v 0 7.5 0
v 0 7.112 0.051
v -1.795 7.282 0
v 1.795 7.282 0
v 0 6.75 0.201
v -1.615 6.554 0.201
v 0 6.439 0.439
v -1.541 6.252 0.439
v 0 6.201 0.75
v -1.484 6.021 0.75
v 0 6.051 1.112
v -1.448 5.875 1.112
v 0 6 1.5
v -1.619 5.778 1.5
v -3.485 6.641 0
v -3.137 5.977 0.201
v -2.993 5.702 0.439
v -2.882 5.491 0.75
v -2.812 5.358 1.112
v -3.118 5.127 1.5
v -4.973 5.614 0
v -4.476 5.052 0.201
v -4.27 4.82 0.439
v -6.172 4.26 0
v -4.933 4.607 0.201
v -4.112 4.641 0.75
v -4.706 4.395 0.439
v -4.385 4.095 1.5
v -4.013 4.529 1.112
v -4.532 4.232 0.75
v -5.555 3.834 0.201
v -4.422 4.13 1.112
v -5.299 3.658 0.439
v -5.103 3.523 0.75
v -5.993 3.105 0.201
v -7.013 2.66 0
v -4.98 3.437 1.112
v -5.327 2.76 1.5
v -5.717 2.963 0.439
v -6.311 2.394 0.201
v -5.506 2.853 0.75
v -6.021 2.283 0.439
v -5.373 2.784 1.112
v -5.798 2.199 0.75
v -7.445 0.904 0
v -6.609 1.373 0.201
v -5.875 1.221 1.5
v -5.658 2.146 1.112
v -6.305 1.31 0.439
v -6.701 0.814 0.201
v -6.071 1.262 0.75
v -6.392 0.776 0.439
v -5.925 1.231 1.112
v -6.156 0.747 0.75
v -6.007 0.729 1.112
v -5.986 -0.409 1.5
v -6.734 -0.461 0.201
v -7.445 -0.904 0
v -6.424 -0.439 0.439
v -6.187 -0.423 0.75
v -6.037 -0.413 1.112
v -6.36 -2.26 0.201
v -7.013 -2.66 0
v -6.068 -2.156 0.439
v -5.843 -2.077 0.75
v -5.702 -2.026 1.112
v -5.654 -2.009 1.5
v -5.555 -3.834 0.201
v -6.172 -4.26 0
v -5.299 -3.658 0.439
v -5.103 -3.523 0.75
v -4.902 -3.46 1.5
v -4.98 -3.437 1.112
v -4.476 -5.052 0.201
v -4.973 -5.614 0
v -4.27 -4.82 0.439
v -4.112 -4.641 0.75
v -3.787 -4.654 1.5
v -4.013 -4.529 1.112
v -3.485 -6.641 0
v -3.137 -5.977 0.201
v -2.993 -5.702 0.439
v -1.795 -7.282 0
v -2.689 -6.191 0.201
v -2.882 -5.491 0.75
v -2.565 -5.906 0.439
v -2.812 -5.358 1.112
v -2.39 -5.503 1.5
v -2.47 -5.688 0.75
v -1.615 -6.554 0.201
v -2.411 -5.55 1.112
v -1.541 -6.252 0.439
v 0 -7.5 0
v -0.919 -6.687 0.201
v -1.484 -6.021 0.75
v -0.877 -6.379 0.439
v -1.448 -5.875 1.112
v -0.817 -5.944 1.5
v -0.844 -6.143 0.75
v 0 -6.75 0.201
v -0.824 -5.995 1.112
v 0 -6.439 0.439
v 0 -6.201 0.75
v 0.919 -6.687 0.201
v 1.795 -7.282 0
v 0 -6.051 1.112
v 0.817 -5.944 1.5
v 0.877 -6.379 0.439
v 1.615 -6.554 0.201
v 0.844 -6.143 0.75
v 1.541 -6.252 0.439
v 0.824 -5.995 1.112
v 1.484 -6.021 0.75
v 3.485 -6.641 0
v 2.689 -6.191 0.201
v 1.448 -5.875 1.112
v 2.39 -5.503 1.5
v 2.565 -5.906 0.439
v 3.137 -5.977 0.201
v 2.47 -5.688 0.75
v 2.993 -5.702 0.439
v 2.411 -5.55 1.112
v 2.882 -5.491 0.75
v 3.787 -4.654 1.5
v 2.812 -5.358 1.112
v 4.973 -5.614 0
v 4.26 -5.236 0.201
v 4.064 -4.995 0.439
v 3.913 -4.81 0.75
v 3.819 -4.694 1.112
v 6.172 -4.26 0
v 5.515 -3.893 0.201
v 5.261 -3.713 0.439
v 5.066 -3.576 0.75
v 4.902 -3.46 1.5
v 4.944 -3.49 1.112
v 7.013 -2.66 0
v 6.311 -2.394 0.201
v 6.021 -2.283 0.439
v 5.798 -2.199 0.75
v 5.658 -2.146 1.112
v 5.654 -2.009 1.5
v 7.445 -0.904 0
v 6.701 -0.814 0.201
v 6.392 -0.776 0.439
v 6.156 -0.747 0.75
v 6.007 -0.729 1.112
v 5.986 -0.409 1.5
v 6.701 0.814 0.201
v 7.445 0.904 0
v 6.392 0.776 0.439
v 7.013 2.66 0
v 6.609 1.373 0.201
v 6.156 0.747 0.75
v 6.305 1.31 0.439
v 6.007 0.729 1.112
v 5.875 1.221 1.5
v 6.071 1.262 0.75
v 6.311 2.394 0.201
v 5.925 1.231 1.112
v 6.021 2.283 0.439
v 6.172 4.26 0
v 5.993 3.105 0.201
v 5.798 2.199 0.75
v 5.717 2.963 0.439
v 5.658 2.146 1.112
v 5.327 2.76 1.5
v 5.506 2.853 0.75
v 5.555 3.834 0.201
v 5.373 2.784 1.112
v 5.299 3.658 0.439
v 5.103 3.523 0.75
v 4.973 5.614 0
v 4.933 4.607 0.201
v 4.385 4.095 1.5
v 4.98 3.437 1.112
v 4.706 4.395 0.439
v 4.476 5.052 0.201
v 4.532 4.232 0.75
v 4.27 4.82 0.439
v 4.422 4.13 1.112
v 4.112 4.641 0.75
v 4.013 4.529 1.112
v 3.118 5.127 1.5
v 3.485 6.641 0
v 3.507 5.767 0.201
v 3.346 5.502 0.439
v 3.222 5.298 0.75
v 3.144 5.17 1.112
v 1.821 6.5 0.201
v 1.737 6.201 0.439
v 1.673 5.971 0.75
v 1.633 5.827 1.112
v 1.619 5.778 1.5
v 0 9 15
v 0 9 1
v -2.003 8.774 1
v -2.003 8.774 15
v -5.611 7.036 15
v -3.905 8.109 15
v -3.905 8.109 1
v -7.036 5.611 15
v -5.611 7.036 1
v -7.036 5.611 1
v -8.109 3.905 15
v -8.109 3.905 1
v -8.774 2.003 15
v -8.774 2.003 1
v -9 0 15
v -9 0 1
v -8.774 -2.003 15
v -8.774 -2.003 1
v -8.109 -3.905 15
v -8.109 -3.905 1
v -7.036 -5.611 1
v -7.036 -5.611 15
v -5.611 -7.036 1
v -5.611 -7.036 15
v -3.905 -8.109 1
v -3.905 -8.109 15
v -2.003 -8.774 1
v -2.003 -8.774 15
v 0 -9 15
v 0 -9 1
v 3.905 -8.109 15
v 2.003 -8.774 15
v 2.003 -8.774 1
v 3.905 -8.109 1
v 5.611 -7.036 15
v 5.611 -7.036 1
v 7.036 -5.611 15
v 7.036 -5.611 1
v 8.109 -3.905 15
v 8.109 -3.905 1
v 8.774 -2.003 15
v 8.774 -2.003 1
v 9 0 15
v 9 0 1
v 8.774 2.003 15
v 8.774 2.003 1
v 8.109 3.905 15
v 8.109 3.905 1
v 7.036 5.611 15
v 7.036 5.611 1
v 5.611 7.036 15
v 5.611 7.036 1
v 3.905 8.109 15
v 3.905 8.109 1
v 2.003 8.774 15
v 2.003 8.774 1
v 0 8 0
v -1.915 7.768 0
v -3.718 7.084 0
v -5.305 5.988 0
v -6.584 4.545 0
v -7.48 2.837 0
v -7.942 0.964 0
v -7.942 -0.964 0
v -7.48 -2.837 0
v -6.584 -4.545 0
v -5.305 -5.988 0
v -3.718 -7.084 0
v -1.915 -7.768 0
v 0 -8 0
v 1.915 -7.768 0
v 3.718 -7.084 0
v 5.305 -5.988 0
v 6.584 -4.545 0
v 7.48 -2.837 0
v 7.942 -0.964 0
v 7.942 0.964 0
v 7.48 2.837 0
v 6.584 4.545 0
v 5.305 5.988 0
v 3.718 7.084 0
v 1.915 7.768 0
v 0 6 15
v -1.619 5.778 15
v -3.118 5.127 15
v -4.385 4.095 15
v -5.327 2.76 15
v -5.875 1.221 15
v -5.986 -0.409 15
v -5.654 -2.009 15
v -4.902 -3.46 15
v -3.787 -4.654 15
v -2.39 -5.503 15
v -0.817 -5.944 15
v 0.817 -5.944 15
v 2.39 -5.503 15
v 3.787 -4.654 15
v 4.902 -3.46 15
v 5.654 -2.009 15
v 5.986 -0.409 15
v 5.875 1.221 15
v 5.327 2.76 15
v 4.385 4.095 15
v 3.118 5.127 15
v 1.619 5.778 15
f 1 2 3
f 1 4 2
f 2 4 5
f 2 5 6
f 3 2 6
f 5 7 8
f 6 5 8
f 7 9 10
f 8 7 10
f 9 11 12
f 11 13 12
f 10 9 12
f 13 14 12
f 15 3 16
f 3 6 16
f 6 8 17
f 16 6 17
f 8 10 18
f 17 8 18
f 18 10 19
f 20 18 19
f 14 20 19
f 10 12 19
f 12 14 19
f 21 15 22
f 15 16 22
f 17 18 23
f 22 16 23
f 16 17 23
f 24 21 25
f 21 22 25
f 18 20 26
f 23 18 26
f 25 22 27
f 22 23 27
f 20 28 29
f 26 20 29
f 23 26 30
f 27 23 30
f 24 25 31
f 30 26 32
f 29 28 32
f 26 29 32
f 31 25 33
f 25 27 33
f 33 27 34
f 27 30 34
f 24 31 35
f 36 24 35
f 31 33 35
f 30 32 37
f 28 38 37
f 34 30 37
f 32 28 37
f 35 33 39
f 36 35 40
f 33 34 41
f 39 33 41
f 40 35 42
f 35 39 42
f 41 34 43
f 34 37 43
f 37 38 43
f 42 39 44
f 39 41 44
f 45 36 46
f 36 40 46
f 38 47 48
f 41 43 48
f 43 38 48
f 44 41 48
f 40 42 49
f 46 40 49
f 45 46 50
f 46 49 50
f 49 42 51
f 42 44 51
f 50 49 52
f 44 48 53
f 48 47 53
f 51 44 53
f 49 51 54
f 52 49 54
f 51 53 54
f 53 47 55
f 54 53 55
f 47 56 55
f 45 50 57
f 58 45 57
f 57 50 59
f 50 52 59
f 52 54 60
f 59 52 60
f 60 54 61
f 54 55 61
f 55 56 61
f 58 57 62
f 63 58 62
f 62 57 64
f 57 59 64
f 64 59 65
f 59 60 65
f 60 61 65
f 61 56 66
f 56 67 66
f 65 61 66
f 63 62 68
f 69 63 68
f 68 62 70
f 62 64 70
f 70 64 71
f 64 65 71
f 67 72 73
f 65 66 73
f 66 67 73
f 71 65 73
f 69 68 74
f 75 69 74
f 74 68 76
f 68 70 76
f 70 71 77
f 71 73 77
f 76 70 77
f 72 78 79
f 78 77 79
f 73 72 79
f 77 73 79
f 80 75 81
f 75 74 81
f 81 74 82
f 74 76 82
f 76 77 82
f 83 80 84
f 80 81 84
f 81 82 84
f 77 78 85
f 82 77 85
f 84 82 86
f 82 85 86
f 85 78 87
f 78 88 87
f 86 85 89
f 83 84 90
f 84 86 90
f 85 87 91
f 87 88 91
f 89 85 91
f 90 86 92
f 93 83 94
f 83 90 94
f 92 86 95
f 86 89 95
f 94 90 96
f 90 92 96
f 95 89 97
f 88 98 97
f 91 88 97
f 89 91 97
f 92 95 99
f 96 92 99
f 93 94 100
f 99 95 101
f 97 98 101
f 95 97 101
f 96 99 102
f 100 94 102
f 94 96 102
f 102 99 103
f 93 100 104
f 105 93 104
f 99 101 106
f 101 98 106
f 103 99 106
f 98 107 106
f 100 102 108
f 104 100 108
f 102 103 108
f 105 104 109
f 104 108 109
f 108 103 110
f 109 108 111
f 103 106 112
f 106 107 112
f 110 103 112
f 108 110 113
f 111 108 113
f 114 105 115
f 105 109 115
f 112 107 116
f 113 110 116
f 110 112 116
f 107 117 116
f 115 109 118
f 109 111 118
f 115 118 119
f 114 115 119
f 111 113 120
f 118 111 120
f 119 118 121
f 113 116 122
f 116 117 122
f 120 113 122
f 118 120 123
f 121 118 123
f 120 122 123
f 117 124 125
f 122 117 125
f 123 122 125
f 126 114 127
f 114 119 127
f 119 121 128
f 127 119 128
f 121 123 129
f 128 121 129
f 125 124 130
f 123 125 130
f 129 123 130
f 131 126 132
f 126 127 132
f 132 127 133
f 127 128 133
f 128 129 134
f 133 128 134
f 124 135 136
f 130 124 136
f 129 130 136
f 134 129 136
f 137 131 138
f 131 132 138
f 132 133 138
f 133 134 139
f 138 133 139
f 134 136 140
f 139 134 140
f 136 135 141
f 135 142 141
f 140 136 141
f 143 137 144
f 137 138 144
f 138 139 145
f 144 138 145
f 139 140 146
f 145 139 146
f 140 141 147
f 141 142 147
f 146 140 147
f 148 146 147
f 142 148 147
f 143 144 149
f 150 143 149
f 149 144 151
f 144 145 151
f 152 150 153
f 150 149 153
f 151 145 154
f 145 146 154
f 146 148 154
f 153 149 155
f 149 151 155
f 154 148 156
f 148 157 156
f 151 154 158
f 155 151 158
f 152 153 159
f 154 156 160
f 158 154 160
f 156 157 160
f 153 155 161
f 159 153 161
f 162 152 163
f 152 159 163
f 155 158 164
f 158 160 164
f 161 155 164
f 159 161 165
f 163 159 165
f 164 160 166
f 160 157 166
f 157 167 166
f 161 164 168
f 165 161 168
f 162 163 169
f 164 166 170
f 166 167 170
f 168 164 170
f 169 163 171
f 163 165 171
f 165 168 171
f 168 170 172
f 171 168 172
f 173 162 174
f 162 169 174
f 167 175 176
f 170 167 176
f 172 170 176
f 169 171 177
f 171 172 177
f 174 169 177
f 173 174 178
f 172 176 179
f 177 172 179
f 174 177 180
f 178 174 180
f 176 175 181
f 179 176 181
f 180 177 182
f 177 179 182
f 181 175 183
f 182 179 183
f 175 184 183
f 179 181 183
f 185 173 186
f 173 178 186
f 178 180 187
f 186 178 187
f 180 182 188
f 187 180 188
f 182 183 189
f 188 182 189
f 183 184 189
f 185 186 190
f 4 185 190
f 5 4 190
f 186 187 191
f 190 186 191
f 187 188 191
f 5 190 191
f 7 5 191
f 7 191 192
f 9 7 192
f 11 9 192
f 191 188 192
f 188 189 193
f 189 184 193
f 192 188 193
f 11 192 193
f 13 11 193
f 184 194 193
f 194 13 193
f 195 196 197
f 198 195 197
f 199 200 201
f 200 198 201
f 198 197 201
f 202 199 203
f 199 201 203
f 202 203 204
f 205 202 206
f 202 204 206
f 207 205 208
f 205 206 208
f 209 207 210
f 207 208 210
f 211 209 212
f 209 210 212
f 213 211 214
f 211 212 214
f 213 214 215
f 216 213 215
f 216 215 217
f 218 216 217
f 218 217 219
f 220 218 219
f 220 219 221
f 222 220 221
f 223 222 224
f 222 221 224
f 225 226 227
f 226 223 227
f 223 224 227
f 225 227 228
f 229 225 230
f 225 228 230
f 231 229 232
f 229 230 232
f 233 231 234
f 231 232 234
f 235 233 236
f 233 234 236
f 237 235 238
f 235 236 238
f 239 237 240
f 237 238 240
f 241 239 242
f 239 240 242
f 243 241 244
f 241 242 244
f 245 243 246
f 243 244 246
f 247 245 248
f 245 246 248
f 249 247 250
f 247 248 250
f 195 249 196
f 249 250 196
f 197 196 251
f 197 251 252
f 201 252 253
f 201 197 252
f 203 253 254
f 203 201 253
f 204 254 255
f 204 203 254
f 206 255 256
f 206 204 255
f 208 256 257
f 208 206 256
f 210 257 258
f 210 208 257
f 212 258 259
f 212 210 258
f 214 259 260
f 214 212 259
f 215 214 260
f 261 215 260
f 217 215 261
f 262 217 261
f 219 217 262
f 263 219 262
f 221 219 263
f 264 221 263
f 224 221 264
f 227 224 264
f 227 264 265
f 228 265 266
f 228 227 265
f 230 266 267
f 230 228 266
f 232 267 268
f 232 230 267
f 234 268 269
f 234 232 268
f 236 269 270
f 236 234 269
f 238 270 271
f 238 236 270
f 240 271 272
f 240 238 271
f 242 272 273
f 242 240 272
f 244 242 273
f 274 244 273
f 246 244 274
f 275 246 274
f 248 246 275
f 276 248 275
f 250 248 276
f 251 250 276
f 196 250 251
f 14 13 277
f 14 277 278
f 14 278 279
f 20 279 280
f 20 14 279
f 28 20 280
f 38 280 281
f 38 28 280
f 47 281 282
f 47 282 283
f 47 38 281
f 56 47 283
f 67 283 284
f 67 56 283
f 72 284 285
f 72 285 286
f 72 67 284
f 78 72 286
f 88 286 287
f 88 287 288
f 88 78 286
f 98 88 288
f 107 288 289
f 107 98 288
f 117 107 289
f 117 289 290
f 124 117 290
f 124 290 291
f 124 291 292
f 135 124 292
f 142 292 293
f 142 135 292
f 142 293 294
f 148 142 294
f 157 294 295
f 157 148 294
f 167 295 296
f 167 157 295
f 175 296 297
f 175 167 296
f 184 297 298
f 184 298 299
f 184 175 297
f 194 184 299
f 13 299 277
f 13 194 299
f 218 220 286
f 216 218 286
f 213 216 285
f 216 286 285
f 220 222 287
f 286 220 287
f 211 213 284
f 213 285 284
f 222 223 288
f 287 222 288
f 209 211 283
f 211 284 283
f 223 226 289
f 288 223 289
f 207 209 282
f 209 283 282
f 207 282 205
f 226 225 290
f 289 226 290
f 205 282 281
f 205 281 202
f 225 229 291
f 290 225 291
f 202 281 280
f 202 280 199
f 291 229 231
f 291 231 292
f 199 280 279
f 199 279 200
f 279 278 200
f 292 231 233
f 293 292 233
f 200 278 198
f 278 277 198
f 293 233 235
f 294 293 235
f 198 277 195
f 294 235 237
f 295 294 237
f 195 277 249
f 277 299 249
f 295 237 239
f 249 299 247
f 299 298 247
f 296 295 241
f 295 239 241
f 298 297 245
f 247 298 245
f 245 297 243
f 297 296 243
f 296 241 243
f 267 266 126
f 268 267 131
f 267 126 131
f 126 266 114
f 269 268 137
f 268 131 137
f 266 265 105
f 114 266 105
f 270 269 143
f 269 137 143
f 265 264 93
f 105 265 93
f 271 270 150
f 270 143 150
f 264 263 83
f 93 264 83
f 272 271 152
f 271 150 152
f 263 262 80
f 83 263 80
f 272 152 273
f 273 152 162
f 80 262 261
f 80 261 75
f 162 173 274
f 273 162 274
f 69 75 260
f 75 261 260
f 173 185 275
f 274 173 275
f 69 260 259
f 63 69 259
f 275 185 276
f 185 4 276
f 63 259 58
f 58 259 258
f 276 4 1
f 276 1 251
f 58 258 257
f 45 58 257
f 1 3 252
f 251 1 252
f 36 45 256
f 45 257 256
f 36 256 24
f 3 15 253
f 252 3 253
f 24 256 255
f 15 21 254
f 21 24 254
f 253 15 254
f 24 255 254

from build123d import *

# Parameters (mm, degrees)
SKETCH_1_W     = 15
SKETCH_1_H     = 3
SKETCH_2_W     = 3
SKETCH_2_H     = 6.5
SKETCH_3_W     = 3
SKETCH_3_H     = 9
CHAMFER_1_SIZE = 1
FILLET_2_R     = 1.5


with BuildPart() as part:
    # 草图1 → 旋转1 (revolve)
    with BuildSketch(Plane(origin=(0, 0, 0), x_dir=(0, 0, -1), z_dir=(1, 0, 0)), mode=Mode.PRIVATE) as revolve_1_sk:
        with Locations((-7.5, -7.5)):
            Rectangle(SKETCH_1_W, SKETCH_1_H)
        Polygon((-15, -9), (-15, -6), (-15, 0), (-18, 0), (-18, -9), align=None)
    revolve(revolve_1_sk.sketch.rotate(Axis((0, 0, 0), (0, 0, 1)), 180), axis=Axis((0, 0, 0), (0, 0, 1)))

    # 草图2 → 切除-旋转1 (revolve, cut)
    with BuildSketch(Plane(origin=(0, 0, 0), x_dir=(0, 0, -1), z_dir=(1, 0, 0)), mode=Mode.PRIVATE) as cut_revolve_1_sk:
        with Locations((-16.5, -3.25)):
            Rectangle(SKETCH_2_W, SKETCH_2_H)
    revolve(cut_revolve_1_sk.sketch.rotate(Axis((0, 0, 18), (0, 0, -1)), 270), axis=Axis((0, 0, 18), (0, 0, -1)), mode=Mode.SUBTRACT)

    # 草图3 → 切除-旋转2 (revolve, cut)
    with BuildSketch(Plane(origin=(0, 0, 0), x_dir=(0, 0, -1), z_dir=(1, 0, 0)), mode=Mode.PRIVATE) as cut_revolve_2_sk:
        with Locations((-16.5, -4.5)):
            Rectangle(SKETCH_3_W, SKETCH_3_H)
    revolve(cut_revolve_2_sk.sketch.rotate(Axis((0, 0, 18), (0, 0, -1)), 180), axis=Axis((0, 0, 18), (0, 0, -1)), mode=Mode.SUBTRACT)

    # 倒角1
    chamfer_1_edges = [part.edges().sort_by_distance(p)[0] for p in [
        (0, -9, 0),
    ]]
    chamfer(chamfer_1_edges, length=CHAMFER_1_SIZE)

    # 圆角2
    fillet_2_edges = [part.edges().sort_by_distance(p)[0] for p in [
        (0, -6, 0),
    ]]
    fillet(fillet_2_edges, radius=FILLET_2_R)


solid = part.part
